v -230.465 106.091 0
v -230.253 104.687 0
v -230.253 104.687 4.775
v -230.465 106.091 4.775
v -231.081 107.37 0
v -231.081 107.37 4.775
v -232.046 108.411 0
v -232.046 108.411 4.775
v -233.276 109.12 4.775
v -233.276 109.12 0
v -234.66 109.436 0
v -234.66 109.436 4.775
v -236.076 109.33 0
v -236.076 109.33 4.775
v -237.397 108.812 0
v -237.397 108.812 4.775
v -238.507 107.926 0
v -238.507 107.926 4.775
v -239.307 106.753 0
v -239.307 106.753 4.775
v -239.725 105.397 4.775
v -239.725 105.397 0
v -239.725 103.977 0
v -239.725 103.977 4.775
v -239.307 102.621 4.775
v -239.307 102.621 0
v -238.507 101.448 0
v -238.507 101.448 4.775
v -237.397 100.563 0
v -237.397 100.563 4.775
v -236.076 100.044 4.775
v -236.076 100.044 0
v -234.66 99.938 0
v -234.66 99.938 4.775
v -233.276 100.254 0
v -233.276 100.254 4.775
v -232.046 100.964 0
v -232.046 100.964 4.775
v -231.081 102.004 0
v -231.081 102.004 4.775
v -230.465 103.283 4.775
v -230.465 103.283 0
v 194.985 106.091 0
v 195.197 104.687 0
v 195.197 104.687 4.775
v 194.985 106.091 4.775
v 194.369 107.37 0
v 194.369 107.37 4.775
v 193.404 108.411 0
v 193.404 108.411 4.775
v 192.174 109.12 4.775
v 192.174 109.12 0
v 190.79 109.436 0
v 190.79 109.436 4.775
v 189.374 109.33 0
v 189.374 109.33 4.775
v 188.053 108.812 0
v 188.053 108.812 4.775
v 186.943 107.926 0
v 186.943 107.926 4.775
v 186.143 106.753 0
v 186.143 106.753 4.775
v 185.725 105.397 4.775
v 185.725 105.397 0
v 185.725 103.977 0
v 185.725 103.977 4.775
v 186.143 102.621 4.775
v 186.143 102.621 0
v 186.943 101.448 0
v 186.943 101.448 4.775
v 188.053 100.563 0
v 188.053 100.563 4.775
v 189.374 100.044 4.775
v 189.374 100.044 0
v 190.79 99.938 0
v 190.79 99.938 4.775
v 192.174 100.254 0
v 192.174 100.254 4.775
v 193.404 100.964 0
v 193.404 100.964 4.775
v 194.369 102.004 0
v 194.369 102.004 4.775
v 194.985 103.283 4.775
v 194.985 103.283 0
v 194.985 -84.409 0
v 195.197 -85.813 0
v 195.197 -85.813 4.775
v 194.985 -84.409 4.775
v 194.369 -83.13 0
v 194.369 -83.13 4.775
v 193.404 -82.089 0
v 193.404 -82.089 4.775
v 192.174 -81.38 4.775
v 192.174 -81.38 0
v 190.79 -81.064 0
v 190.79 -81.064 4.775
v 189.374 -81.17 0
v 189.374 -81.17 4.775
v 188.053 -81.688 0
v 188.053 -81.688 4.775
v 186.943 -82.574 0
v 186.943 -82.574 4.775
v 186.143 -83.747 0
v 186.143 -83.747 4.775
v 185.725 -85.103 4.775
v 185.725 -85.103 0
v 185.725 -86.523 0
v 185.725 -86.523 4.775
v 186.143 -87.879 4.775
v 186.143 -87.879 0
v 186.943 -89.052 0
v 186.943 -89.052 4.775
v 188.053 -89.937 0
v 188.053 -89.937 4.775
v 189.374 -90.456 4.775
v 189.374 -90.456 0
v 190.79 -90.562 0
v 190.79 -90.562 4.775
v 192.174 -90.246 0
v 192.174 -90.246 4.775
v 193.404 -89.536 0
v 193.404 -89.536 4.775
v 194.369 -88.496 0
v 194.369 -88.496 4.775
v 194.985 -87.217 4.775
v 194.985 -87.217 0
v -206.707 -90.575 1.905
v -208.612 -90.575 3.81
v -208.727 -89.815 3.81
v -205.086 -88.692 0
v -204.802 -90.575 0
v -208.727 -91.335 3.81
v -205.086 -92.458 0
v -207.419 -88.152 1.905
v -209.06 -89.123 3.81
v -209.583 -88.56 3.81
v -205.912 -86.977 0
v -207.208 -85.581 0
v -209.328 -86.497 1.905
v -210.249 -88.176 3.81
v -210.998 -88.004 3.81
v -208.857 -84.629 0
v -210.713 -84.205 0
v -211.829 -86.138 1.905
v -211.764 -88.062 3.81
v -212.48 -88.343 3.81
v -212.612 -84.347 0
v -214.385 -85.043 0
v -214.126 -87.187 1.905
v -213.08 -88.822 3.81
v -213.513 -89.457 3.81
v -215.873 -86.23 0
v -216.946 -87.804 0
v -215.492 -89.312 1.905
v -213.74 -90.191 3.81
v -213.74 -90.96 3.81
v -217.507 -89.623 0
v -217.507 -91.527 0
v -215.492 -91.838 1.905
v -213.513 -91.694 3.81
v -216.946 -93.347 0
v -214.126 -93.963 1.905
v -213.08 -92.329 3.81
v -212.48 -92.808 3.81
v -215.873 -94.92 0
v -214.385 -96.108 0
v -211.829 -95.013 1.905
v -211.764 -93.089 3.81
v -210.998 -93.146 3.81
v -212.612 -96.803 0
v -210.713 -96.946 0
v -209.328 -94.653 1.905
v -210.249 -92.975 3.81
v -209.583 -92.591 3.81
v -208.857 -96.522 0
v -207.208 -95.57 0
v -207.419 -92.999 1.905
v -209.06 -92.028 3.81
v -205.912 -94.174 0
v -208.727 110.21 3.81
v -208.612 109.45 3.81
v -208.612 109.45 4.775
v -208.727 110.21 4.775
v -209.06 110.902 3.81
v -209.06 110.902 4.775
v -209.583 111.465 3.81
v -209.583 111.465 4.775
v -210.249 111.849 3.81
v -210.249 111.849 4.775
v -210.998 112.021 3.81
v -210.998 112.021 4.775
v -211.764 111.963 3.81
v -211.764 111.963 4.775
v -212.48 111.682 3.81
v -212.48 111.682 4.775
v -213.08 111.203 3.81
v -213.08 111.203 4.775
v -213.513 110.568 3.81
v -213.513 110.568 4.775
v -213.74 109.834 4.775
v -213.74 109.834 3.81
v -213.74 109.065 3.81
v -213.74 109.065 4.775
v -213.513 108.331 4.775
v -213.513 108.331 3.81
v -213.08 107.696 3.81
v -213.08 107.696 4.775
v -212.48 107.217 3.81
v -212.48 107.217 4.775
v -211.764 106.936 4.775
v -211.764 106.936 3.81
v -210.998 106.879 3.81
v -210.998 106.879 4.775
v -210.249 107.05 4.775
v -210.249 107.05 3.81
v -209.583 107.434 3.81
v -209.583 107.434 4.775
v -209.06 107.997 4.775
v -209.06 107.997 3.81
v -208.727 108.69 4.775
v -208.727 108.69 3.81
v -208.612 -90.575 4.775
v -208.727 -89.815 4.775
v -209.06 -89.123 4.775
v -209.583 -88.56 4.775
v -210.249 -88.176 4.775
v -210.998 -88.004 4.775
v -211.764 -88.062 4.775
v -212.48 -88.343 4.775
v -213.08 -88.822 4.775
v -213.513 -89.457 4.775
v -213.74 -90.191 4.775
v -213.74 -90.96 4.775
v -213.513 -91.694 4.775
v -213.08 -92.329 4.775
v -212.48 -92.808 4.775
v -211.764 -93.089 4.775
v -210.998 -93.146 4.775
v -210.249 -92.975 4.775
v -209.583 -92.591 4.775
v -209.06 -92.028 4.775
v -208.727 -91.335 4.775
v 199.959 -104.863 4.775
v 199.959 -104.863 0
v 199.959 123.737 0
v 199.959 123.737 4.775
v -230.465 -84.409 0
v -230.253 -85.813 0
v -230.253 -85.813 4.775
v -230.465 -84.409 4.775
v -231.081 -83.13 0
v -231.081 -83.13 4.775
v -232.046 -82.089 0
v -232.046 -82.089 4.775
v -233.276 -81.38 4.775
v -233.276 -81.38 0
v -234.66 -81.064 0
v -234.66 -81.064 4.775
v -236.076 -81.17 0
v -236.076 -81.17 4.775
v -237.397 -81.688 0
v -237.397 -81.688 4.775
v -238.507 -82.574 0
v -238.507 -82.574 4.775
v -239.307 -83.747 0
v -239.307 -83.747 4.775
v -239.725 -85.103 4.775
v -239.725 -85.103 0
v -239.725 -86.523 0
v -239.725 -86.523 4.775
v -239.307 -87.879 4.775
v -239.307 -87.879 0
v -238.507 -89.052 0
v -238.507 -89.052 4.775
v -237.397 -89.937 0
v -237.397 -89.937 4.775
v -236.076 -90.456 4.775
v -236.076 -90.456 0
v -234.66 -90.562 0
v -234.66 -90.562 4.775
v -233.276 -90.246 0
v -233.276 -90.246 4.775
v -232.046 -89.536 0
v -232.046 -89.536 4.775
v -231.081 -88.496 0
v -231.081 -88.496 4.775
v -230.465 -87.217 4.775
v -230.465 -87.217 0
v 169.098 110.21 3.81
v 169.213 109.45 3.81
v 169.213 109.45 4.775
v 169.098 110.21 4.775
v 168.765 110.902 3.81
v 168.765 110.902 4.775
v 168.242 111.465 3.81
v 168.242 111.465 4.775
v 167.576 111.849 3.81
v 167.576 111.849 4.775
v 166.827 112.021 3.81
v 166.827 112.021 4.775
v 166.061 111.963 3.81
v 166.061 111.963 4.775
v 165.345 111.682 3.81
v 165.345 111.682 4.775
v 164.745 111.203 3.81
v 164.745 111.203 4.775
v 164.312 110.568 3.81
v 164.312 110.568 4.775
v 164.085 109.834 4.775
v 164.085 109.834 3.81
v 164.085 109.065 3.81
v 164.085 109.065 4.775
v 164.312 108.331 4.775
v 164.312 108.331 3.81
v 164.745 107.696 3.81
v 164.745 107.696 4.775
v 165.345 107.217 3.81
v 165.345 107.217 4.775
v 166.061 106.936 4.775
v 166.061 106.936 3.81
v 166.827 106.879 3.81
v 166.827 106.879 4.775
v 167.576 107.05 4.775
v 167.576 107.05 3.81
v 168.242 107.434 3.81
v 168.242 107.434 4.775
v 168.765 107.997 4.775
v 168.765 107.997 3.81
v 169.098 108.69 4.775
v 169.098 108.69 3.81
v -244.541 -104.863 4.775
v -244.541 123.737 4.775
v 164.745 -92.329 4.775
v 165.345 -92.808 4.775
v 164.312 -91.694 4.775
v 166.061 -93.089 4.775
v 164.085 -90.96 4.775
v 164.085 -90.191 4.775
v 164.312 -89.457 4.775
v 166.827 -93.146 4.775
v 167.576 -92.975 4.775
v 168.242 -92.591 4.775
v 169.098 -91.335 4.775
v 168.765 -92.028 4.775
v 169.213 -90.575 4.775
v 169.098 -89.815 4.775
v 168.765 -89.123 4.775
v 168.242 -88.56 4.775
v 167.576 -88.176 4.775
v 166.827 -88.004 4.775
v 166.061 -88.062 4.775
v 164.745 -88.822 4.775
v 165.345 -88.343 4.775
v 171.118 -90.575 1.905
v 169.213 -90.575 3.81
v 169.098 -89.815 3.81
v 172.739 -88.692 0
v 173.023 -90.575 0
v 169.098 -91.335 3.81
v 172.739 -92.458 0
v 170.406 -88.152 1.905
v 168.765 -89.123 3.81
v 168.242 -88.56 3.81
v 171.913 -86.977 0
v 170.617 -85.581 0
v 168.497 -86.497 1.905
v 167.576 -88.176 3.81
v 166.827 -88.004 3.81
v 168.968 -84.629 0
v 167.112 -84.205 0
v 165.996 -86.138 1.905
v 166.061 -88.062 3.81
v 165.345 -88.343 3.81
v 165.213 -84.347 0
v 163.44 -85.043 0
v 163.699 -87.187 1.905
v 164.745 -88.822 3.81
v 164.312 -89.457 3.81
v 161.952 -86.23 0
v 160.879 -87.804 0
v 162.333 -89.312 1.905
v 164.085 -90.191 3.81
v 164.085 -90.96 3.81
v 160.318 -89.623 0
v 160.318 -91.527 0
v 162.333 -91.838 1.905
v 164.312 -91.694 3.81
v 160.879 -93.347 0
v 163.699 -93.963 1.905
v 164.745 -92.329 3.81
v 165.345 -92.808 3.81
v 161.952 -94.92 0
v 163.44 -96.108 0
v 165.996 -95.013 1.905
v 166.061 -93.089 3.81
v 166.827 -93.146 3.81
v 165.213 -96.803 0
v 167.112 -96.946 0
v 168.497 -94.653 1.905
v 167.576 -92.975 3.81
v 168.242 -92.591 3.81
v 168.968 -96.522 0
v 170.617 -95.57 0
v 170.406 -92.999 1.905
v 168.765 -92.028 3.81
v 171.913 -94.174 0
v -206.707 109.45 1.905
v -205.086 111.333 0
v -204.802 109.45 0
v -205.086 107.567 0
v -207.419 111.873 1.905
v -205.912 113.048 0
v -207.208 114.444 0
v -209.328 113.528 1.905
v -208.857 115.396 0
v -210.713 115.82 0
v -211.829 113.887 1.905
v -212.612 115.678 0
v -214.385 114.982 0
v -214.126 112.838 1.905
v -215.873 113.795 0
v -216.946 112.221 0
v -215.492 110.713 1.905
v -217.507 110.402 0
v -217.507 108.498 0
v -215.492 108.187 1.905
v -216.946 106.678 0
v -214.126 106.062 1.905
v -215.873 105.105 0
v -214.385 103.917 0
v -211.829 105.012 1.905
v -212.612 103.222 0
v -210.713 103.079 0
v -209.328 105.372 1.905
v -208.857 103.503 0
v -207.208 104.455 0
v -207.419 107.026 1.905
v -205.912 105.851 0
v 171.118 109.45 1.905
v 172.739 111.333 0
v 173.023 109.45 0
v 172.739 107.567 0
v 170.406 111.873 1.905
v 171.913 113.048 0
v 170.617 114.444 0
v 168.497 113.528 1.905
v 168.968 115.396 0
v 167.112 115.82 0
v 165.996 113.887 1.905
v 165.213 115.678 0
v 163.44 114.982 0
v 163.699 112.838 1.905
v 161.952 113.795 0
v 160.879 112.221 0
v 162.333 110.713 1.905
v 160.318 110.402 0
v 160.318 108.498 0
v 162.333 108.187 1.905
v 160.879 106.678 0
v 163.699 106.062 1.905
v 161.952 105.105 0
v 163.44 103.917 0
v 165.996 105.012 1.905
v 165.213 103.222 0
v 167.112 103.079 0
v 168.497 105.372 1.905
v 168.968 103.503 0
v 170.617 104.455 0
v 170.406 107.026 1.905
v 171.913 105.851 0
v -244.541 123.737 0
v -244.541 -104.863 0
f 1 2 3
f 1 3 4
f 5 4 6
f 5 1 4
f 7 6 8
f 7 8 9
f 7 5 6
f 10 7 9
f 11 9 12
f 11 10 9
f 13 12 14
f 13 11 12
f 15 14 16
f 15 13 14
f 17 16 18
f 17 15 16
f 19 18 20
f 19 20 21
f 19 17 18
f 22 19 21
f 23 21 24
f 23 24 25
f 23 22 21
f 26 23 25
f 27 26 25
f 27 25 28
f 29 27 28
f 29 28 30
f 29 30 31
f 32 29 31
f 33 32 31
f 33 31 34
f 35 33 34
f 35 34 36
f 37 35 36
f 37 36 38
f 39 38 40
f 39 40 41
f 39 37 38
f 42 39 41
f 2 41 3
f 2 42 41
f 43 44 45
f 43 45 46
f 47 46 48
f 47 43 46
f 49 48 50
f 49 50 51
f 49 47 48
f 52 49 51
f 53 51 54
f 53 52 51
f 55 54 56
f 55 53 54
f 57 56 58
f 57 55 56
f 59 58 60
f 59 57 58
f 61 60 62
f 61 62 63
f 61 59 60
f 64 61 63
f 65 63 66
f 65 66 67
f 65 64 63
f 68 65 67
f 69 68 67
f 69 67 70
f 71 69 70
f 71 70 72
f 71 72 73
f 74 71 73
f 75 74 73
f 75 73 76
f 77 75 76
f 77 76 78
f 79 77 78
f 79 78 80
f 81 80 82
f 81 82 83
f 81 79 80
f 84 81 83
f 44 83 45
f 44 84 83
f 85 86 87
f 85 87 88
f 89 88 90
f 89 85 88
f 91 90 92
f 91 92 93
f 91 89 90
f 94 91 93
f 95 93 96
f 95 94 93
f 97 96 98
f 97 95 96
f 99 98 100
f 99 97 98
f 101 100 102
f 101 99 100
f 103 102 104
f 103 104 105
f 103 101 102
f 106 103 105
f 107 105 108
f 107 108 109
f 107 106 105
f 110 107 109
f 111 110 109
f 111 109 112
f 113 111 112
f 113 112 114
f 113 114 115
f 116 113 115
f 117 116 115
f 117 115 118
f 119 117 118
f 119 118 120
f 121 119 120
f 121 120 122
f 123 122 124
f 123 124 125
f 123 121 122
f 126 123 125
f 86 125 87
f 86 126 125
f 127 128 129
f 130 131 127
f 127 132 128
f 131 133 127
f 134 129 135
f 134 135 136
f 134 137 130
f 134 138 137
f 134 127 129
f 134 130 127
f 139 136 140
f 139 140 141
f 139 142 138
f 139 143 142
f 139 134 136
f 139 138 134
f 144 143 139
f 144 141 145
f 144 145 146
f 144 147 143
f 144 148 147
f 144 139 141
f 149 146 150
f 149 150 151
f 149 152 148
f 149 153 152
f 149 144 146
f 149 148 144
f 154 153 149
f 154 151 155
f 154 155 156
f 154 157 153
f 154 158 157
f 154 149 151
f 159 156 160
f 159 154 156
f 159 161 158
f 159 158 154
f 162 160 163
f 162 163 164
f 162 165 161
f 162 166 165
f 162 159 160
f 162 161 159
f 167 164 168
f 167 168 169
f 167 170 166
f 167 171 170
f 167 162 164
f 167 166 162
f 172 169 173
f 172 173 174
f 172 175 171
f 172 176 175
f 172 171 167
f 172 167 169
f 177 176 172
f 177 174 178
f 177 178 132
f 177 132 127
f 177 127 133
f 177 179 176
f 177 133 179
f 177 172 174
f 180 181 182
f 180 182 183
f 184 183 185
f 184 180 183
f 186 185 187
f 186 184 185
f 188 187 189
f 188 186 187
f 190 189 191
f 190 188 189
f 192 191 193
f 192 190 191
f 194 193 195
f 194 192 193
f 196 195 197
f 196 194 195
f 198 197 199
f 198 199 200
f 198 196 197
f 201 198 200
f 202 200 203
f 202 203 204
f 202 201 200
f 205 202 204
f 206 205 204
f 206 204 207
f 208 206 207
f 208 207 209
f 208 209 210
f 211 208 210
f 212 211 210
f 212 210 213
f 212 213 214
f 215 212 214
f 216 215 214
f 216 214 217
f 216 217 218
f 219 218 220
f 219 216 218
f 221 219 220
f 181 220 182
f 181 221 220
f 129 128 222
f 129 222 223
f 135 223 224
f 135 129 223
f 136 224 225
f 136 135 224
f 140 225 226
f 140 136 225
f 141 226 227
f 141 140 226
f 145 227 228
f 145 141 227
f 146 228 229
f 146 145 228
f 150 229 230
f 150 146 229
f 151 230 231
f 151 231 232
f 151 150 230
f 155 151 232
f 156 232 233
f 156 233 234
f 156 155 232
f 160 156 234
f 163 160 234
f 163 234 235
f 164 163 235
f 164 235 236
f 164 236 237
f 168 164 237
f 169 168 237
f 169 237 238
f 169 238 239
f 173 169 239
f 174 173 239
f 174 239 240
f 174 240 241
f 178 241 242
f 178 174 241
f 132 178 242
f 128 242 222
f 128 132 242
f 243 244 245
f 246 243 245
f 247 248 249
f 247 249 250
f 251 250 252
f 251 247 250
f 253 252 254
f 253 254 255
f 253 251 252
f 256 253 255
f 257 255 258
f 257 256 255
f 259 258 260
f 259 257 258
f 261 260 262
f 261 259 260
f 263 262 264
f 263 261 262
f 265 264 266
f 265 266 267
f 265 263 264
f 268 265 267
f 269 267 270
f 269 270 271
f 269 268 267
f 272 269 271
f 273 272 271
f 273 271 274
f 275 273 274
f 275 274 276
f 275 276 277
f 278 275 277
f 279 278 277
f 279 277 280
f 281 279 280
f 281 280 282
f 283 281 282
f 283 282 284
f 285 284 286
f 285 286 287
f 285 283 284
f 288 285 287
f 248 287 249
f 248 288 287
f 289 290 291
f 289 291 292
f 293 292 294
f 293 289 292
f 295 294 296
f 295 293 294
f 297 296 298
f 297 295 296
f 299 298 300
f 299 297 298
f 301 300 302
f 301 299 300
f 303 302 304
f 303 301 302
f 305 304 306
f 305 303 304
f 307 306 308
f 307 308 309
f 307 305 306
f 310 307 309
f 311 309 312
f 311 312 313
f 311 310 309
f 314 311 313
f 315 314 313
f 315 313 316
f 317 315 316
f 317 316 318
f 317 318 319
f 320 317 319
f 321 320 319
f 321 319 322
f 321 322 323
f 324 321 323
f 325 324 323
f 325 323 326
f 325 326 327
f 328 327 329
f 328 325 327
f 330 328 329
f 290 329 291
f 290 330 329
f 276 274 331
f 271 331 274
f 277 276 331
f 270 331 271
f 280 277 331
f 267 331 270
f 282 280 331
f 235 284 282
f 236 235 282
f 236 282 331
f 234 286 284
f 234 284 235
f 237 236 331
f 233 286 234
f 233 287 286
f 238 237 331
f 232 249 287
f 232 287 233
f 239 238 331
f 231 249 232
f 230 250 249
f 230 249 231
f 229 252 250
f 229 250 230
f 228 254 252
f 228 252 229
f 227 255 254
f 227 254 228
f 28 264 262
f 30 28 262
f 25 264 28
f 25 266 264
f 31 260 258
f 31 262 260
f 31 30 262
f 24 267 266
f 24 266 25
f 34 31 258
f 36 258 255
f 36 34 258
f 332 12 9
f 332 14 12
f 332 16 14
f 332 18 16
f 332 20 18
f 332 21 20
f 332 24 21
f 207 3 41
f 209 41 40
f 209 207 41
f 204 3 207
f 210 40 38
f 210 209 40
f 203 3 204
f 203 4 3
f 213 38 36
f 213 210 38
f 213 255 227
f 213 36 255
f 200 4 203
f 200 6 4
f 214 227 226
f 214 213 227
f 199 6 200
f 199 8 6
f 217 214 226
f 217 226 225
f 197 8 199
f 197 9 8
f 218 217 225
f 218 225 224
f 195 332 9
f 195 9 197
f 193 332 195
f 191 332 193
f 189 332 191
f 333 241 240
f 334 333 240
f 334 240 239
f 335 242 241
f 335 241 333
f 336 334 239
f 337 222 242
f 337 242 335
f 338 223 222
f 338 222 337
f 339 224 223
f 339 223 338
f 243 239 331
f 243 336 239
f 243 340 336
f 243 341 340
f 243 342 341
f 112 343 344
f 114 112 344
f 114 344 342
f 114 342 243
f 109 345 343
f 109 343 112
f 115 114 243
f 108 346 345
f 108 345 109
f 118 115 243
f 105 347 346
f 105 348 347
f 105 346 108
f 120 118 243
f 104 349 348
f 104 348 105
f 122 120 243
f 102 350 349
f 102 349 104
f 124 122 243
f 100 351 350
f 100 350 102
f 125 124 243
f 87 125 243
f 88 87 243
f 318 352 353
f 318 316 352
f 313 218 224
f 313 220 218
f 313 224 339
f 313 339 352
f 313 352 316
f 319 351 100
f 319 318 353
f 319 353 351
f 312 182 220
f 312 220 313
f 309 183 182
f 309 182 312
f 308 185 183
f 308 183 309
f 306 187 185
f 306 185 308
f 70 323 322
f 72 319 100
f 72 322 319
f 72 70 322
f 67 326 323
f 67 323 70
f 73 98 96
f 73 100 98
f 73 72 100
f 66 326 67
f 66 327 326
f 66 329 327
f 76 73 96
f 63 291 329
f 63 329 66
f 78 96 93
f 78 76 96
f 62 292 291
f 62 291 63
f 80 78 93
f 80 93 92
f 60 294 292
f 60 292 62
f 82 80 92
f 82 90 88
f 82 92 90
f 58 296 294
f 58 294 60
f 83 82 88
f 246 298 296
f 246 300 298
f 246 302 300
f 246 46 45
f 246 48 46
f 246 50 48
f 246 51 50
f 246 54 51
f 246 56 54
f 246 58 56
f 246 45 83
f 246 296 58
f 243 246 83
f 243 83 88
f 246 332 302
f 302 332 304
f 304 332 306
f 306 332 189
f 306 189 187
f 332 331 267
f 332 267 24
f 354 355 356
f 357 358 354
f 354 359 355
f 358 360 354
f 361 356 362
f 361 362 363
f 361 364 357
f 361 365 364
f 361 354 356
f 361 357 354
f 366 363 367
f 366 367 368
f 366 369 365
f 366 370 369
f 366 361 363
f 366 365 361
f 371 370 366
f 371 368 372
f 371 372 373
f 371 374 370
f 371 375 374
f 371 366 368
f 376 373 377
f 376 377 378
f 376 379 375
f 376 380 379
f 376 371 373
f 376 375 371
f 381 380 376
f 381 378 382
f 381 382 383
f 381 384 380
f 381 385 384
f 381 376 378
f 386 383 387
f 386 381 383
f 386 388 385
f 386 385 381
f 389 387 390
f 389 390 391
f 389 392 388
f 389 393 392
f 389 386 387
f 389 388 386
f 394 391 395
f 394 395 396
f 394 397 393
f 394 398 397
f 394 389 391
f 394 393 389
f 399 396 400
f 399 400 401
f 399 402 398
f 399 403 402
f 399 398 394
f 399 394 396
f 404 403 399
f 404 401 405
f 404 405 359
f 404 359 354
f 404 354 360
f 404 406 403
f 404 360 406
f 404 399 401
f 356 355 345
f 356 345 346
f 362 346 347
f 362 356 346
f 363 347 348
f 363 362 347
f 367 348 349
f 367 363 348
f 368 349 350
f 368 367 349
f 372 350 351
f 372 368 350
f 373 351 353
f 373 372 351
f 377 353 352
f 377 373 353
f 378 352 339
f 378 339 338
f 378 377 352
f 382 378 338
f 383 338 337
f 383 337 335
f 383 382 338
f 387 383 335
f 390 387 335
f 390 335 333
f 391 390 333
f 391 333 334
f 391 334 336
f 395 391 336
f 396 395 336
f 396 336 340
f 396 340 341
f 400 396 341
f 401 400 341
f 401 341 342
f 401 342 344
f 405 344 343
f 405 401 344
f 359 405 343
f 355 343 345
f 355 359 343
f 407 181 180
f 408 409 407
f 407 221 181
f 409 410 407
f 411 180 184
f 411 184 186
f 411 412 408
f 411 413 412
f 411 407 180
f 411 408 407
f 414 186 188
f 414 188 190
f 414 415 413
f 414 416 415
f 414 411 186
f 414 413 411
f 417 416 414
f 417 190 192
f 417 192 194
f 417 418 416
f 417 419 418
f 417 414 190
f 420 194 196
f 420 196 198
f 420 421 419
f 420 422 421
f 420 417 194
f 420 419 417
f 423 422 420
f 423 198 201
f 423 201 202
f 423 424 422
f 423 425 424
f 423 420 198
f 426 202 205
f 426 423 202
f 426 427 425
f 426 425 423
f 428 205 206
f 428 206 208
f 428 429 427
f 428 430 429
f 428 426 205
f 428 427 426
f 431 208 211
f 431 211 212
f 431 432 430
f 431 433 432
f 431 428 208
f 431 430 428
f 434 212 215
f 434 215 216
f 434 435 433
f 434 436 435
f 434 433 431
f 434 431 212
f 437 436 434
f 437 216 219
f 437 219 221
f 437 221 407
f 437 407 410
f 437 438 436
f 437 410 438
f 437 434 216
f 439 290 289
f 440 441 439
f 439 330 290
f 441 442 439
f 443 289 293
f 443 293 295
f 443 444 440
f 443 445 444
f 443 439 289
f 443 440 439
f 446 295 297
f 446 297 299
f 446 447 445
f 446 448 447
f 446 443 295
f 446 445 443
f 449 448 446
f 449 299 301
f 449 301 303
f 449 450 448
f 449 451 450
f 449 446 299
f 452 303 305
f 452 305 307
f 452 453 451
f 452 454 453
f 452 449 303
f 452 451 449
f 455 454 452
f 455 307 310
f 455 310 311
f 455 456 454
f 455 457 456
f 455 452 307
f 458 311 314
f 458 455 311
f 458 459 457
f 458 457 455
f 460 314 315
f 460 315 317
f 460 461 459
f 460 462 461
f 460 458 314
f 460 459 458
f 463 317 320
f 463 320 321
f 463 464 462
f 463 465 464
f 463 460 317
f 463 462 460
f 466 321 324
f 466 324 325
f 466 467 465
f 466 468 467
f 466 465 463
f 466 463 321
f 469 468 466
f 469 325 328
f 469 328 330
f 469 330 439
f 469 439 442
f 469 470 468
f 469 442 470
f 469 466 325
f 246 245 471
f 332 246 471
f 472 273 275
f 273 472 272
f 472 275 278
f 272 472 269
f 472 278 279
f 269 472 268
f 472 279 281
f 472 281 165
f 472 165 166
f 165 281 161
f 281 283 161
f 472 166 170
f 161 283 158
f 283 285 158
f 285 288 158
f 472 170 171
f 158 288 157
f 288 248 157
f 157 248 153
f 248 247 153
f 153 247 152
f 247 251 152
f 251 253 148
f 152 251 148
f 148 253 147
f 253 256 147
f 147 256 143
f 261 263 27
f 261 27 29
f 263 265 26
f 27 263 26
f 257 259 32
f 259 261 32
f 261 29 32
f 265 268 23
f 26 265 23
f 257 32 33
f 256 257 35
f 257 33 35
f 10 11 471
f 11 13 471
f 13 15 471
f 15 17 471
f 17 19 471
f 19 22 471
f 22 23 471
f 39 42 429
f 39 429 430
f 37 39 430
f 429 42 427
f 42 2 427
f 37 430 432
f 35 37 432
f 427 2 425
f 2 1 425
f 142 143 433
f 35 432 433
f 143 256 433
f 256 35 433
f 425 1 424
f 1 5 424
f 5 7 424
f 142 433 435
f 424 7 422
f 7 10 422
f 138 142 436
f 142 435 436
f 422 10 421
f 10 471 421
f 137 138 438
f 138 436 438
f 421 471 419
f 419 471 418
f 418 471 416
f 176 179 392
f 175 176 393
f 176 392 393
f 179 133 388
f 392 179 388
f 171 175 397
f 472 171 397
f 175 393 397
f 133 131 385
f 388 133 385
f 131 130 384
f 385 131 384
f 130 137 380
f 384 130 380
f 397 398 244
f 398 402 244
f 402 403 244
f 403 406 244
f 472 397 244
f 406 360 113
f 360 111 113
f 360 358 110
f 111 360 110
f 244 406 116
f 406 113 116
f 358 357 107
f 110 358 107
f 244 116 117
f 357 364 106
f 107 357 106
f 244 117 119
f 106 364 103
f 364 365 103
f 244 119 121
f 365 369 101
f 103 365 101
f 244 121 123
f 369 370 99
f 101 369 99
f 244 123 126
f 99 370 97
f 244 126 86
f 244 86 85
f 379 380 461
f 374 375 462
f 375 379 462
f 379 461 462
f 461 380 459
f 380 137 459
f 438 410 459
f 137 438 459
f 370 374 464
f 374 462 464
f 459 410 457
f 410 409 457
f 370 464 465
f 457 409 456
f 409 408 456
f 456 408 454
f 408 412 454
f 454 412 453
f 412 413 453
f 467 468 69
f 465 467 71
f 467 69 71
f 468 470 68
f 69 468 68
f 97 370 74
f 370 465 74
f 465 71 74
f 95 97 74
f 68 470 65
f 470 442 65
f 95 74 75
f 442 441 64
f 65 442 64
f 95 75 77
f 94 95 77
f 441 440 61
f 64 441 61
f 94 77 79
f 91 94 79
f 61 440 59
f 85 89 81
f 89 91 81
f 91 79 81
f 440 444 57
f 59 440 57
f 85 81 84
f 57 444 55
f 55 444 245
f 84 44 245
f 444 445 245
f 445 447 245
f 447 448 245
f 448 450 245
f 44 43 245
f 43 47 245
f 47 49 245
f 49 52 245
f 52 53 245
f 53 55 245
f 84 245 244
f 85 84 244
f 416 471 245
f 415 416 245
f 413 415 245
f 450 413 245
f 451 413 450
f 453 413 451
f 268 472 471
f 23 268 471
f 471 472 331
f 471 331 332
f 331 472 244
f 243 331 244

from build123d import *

# Parameters (mm, degrees)
F0_W     = 406.4
F0_H     = 228.6
F0_W_2   = 396.875
F0_H_2   = 219.075
F0_W_3   = 19.05
F0_R     = 4.7625
F0_W_4   = 12.7
F0_H_3   = 12.7
F0_R_2   = 2.5781
F1_DEPTH = 4.7752
F2_SIZE  = 3.81


with BuildPart() as f1:
    # F0 (on Top) → F1 (new body)
    with BuildSketch(Plane.XY):
        with Locations((-22.290767, 9.43711)):
            Rectangle(F0_W, F0_H)
        with Locations((-22.278067, 9.43711)):
            Rectangle(F0_W_2, F0_H_2, mode=Mode.SUBTRACT)
        with Locations((-235.015767, 9.43711)):
            Rectangle(F0_W_3, F0_H)
        with Locations((-235.015767, -85.81289)):
            Circle(F0_R, mode=Mode.SUBTRACT)
        with Locations((-235.015767, 104.68711)):
            Circle(F0_R, mode=Mode.SUBTRACT)
        with Locations((190.434233, 9.43711)):
            Rectangle(F0_W_3, F0_H)
        with Locations((190.434233, -85.81289)):
            Circle(F0_R, mode=Mode.SUBTRACT)
        with Locations((190.434233, 104.68711)):
            Circle(F0_R, mode=Mode.SUBTRACT)
        with Locations((-22.278067, 9.43711)):
            Rectangle(F0_W_2, F0_H_2)
        with Locations((-211.190567, -90.57539)):
            Rectangle(F0_W_4, F0_H_3, mode=Mode.SUBTRACT)
        with Locations((166.634433, -90.57539)):
            Rectangle(F0_W_4, F0_H_3, mode=Mode.SUBTRACT)
        with Locations((-211.190567, 109.44961)):
            Rectangle(F0_W_4, F0_H_3, mode=Mode.SUBTRACT)
        with Locations((166.634433, 109.44961)):
            Rectangle(F0_W_4, F0_H_3, mode=Mode.SUBTRACT)
        with Locations((-211.190567, 109.44961)):
            Rectangle(F0_W_4, F0_H_3)
        with Locations((-211.190567, 109.44961)):
            Circle(F0_R_2, mode=Mode.SUBTRACT)
        with Locations((-211.190567, -90.57539)):
            Rectangle(F0_W_4, F0_H_3)
        with Locations((-211.190567, -90.57539)):
            Circle(F0_R_2, mode=Mode.SUBTRACT)
        with Locations((166.634433, -90.57539)):
            Rectangle(F0_W_4, F0_H_3)
        with Locations((166.634433, -90.57539)):
            Circle(F0_R_2, mode=Mode.SUBTRACT)
        with Locations((166.634433, 109.44961)):
            Rectangle(F0_W_4, F0_H_3)
        with Locations((166.634433, 109.44961)):
            Circle(F0_R_2, mode=Mode.SUBTRACT)
    extrude(amount=F1_DEPTH)

    # F2
    f2_edges = [f1.edges().sort_by_distance(p)[0] for p in [
        (-213.768667, -90.57539, 0),
        (164.056333, -90.57539, 0),
        (164.056333, 109.44961, 0),
        (-213.768667, 109.44961, 0),
    ]]
    chamfer(f2_edges, length=F2_SIZE)


solid = f1.part
